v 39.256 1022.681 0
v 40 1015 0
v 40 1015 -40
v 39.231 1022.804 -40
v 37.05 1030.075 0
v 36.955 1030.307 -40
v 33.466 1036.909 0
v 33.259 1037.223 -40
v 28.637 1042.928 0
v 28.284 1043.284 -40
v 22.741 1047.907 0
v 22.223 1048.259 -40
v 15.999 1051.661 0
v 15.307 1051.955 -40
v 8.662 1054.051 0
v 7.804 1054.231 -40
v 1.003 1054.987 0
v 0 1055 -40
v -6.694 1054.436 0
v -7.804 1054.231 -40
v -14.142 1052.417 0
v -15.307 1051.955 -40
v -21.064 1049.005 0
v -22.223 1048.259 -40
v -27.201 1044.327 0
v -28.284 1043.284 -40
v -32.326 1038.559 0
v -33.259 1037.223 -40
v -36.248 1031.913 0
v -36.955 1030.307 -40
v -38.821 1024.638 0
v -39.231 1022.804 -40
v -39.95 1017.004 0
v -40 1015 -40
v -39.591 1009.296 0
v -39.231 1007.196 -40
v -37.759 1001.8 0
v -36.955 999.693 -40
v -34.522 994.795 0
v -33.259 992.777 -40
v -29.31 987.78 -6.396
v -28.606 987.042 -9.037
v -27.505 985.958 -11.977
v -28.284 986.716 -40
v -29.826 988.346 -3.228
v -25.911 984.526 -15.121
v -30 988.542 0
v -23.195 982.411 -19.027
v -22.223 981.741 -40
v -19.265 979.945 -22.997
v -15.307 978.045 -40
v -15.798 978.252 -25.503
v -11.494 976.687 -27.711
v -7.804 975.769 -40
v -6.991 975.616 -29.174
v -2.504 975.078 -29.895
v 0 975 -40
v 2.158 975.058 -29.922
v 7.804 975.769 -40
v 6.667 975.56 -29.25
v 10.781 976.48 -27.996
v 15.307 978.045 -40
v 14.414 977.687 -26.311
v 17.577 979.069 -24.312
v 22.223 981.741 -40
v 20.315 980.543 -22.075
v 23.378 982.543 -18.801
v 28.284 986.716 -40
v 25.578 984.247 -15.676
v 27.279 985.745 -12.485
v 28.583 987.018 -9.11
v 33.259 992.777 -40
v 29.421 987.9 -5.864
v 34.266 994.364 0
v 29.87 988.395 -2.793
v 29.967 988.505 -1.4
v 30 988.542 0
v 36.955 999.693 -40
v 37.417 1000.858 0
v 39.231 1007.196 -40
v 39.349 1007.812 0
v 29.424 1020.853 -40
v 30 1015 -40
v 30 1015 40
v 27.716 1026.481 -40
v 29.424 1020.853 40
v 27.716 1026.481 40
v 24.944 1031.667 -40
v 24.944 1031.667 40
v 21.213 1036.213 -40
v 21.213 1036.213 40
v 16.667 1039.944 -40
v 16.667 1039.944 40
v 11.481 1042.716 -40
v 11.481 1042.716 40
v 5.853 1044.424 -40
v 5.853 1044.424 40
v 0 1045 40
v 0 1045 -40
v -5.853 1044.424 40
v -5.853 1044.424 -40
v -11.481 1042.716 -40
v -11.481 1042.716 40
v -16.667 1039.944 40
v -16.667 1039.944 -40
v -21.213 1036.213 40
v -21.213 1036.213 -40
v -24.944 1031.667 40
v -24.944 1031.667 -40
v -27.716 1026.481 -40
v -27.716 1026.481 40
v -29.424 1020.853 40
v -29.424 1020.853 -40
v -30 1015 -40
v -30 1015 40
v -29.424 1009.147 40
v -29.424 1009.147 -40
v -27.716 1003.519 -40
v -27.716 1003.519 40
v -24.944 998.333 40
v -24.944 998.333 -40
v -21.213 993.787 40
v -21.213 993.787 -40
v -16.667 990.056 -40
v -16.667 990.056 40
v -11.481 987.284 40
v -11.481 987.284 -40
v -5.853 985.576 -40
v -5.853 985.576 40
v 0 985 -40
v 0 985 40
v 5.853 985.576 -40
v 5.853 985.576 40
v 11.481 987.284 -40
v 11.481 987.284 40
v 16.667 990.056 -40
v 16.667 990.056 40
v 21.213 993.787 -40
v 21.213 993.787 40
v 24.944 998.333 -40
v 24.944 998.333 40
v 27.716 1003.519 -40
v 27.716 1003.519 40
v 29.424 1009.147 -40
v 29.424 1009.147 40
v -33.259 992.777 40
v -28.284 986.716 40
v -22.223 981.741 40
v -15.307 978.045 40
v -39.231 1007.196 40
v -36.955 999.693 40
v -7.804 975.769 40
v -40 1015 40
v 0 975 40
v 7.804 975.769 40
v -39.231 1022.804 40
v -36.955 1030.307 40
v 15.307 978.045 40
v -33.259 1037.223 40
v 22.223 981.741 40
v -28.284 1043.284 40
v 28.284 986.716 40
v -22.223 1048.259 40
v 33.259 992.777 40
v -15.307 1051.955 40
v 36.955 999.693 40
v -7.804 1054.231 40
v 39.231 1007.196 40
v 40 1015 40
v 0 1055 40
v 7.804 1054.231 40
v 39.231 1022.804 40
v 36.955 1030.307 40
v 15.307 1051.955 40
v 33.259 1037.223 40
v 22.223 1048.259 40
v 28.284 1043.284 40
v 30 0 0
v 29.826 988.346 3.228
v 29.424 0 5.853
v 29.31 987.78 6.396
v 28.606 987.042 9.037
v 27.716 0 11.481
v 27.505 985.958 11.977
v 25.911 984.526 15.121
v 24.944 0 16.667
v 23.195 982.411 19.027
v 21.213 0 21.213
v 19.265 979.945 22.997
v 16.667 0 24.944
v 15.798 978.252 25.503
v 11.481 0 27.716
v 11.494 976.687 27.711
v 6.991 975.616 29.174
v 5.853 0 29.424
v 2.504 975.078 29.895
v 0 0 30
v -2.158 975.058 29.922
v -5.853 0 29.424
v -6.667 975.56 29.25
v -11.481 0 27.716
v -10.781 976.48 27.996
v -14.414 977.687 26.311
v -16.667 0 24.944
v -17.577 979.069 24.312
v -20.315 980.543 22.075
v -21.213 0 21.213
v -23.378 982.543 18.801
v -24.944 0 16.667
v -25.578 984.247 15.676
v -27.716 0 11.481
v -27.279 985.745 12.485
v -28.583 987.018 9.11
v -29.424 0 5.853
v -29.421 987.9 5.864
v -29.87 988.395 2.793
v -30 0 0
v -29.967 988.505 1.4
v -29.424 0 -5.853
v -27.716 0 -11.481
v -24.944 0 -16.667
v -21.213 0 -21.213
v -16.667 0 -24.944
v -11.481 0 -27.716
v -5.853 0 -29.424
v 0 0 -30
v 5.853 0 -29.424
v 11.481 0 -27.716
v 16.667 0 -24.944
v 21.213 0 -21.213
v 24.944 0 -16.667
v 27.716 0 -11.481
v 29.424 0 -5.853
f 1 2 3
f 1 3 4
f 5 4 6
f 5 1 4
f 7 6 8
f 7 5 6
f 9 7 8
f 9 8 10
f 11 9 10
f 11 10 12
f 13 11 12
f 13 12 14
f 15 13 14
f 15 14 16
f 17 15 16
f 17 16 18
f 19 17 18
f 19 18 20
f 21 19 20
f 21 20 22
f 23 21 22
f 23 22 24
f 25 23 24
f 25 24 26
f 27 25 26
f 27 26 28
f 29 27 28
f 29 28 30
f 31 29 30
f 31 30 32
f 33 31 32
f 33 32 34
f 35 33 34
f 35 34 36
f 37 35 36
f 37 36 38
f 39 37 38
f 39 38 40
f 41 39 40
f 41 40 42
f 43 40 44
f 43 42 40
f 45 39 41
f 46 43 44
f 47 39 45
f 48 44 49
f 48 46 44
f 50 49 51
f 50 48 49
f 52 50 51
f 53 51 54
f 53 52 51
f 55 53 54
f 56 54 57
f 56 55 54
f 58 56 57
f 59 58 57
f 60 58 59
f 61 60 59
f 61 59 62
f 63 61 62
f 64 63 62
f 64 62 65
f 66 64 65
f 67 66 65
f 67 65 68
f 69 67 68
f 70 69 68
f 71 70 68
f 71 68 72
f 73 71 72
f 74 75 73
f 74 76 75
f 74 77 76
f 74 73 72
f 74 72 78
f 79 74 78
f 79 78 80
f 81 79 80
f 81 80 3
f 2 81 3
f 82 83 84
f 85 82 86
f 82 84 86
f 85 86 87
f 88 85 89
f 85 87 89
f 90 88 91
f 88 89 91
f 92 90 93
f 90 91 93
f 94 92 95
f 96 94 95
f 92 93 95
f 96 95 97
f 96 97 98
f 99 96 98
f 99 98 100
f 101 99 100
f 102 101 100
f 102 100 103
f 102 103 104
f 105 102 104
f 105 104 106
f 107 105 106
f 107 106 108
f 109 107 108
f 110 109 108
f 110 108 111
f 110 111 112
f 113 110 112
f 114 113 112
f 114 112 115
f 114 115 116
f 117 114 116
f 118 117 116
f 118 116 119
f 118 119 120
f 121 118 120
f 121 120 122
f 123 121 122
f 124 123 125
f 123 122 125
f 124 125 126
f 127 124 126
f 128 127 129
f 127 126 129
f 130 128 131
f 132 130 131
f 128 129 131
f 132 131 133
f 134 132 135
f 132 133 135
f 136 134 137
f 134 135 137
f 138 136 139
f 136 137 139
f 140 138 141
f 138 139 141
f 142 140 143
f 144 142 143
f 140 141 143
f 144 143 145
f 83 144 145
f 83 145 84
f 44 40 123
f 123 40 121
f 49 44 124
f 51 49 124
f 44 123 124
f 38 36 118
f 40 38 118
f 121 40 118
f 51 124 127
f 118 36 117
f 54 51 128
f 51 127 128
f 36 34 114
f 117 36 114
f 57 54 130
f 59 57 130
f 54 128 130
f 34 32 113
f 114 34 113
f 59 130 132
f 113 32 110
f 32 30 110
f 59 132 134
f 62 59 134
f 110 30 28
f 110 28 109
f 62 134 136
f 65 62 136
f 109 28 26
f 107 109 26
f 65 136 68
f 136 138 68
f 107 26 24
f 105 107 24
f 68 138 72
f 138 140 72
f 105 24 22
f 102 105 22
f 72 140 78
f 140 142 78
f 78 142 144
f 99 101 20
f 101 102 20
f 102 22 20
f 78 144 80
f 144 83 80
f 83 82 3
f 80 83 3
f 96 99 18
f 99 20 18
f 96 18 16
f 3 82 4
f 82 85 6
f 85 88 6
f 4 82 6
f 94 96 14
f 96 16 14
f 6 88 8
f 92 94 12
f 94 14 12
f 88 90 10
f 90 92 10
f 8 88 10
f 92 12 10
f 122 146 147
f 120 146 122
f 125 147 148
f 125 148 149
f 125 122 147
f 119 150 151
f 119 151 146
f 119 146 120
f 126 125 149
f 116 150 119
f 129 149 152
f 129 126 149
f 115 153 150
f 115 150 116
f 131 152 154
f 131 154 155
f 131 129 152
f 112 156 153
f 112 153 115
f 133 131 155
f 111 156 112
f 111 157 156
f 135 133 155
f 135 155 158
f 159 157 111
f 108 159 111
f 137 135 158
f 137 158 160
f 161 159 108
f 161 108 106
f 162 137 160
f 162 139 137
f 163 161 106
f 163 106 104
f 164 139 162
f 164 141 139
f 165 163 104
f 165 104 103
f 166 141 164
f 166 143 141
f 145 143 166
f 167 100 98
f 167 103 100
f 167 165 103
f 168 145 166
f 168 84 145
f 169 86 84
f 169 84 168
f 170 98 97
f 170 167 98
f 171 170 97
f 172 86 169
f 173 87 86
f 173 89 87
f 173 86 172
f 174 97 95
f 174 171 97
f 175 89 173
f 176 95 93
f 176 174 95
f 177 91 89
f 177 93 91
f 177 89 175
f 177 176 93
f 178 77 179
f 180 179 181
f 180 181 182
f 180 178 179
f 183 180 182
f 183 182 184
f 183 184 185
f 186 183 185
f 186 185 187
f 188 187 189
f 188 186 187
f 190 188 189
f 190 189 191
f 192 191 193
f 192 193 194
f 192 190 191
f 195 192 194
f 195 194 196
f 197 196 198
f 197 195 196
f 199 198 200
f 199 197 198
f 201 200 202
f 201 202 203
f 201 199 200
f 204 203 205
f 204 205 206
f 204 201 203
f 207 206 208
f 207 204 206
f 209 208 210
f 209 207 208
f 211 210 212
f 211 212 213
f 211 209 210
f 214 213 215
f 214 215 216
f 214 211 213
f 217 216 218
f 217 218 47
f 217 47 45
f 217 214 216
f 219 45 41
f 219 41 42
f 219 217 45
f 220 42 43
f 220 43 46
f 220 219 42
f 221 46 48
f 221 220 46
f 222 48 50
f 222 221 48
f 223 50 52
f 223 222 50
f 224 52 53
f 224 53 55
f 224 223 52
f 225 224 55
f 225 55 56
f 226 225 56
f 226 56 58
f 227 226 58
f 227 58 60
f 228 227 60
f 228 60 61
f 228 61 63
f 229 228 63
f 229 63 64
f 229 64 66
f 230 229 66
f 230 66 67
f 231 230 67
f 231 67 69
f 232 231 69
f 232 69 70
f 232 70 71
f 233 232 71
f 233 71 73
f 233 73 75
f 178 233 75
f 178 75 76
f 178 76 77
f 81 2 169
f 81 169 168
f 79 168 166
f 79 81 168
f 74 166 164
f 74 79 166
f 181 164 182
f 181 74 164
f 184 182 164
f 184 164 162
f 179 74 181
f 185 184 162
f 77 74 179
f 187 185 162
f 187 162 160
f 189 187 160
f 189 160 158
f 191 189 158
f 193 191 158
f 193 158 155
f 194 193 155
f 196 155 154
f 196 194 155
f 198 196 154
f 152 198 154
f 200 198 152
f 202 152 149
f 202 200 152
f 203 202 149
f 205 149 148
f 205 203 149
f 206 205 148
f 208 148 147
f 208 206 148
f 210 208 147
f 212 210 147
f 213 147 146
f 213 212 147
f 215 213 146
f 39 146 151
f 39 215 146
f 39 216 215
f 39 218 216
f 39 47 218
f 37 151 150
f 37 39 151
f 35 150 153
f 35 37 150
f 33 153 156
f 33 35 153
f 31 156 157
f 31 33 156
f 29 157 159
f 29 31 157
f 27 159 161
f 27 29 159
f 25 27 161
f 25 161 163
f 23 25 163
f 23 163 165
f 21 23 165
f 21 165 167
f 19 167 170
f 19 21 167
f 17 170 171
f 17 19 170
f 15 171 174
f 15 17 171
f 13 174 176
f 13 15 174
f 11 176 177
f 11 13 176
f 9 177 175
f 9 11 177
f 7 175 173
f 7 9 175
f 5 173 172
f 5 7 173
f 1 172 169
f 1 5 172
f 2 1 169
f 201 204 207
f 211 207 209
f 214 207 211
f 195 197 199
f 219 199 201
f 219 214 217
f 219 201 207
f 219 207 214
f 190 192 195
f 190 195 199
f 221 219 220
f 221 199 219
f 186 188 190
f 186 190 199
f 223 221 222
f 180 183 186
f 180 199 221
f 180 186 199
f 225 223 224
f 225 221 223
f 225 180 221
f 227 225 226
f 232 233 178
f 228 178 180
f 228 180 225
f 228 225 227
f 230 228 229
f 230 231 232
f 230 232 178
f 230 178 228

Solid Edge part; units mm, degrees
sketch "Sketch1" plane through (0, 0, 0) normal (0, -1, 0) x (1, 0, 0)
  circle A0 centre (0, 0) radius 30
  dimension "D1" = 60
extrude "Protrusion1" add sketch "Sketch1" against normal blind 1015
sketch "Sketch2" plane through (0, 0, 0) normal (0, 0, 1) x (1, 0, 0)
  circle A0 centre (0, 1015) radius 40
extrude "ExtrudedProtrusion_4" add sketch "Sketch2" along normal mid plane 80
sketch "Sketch3" plane through (0, 528, 40) normal (0, 0, 1) x (1, 0, 0)
  circle A0 centre (0, 487) radius 30
extrude "Cutout1" cut sketch "Sketch3" against normal through all
